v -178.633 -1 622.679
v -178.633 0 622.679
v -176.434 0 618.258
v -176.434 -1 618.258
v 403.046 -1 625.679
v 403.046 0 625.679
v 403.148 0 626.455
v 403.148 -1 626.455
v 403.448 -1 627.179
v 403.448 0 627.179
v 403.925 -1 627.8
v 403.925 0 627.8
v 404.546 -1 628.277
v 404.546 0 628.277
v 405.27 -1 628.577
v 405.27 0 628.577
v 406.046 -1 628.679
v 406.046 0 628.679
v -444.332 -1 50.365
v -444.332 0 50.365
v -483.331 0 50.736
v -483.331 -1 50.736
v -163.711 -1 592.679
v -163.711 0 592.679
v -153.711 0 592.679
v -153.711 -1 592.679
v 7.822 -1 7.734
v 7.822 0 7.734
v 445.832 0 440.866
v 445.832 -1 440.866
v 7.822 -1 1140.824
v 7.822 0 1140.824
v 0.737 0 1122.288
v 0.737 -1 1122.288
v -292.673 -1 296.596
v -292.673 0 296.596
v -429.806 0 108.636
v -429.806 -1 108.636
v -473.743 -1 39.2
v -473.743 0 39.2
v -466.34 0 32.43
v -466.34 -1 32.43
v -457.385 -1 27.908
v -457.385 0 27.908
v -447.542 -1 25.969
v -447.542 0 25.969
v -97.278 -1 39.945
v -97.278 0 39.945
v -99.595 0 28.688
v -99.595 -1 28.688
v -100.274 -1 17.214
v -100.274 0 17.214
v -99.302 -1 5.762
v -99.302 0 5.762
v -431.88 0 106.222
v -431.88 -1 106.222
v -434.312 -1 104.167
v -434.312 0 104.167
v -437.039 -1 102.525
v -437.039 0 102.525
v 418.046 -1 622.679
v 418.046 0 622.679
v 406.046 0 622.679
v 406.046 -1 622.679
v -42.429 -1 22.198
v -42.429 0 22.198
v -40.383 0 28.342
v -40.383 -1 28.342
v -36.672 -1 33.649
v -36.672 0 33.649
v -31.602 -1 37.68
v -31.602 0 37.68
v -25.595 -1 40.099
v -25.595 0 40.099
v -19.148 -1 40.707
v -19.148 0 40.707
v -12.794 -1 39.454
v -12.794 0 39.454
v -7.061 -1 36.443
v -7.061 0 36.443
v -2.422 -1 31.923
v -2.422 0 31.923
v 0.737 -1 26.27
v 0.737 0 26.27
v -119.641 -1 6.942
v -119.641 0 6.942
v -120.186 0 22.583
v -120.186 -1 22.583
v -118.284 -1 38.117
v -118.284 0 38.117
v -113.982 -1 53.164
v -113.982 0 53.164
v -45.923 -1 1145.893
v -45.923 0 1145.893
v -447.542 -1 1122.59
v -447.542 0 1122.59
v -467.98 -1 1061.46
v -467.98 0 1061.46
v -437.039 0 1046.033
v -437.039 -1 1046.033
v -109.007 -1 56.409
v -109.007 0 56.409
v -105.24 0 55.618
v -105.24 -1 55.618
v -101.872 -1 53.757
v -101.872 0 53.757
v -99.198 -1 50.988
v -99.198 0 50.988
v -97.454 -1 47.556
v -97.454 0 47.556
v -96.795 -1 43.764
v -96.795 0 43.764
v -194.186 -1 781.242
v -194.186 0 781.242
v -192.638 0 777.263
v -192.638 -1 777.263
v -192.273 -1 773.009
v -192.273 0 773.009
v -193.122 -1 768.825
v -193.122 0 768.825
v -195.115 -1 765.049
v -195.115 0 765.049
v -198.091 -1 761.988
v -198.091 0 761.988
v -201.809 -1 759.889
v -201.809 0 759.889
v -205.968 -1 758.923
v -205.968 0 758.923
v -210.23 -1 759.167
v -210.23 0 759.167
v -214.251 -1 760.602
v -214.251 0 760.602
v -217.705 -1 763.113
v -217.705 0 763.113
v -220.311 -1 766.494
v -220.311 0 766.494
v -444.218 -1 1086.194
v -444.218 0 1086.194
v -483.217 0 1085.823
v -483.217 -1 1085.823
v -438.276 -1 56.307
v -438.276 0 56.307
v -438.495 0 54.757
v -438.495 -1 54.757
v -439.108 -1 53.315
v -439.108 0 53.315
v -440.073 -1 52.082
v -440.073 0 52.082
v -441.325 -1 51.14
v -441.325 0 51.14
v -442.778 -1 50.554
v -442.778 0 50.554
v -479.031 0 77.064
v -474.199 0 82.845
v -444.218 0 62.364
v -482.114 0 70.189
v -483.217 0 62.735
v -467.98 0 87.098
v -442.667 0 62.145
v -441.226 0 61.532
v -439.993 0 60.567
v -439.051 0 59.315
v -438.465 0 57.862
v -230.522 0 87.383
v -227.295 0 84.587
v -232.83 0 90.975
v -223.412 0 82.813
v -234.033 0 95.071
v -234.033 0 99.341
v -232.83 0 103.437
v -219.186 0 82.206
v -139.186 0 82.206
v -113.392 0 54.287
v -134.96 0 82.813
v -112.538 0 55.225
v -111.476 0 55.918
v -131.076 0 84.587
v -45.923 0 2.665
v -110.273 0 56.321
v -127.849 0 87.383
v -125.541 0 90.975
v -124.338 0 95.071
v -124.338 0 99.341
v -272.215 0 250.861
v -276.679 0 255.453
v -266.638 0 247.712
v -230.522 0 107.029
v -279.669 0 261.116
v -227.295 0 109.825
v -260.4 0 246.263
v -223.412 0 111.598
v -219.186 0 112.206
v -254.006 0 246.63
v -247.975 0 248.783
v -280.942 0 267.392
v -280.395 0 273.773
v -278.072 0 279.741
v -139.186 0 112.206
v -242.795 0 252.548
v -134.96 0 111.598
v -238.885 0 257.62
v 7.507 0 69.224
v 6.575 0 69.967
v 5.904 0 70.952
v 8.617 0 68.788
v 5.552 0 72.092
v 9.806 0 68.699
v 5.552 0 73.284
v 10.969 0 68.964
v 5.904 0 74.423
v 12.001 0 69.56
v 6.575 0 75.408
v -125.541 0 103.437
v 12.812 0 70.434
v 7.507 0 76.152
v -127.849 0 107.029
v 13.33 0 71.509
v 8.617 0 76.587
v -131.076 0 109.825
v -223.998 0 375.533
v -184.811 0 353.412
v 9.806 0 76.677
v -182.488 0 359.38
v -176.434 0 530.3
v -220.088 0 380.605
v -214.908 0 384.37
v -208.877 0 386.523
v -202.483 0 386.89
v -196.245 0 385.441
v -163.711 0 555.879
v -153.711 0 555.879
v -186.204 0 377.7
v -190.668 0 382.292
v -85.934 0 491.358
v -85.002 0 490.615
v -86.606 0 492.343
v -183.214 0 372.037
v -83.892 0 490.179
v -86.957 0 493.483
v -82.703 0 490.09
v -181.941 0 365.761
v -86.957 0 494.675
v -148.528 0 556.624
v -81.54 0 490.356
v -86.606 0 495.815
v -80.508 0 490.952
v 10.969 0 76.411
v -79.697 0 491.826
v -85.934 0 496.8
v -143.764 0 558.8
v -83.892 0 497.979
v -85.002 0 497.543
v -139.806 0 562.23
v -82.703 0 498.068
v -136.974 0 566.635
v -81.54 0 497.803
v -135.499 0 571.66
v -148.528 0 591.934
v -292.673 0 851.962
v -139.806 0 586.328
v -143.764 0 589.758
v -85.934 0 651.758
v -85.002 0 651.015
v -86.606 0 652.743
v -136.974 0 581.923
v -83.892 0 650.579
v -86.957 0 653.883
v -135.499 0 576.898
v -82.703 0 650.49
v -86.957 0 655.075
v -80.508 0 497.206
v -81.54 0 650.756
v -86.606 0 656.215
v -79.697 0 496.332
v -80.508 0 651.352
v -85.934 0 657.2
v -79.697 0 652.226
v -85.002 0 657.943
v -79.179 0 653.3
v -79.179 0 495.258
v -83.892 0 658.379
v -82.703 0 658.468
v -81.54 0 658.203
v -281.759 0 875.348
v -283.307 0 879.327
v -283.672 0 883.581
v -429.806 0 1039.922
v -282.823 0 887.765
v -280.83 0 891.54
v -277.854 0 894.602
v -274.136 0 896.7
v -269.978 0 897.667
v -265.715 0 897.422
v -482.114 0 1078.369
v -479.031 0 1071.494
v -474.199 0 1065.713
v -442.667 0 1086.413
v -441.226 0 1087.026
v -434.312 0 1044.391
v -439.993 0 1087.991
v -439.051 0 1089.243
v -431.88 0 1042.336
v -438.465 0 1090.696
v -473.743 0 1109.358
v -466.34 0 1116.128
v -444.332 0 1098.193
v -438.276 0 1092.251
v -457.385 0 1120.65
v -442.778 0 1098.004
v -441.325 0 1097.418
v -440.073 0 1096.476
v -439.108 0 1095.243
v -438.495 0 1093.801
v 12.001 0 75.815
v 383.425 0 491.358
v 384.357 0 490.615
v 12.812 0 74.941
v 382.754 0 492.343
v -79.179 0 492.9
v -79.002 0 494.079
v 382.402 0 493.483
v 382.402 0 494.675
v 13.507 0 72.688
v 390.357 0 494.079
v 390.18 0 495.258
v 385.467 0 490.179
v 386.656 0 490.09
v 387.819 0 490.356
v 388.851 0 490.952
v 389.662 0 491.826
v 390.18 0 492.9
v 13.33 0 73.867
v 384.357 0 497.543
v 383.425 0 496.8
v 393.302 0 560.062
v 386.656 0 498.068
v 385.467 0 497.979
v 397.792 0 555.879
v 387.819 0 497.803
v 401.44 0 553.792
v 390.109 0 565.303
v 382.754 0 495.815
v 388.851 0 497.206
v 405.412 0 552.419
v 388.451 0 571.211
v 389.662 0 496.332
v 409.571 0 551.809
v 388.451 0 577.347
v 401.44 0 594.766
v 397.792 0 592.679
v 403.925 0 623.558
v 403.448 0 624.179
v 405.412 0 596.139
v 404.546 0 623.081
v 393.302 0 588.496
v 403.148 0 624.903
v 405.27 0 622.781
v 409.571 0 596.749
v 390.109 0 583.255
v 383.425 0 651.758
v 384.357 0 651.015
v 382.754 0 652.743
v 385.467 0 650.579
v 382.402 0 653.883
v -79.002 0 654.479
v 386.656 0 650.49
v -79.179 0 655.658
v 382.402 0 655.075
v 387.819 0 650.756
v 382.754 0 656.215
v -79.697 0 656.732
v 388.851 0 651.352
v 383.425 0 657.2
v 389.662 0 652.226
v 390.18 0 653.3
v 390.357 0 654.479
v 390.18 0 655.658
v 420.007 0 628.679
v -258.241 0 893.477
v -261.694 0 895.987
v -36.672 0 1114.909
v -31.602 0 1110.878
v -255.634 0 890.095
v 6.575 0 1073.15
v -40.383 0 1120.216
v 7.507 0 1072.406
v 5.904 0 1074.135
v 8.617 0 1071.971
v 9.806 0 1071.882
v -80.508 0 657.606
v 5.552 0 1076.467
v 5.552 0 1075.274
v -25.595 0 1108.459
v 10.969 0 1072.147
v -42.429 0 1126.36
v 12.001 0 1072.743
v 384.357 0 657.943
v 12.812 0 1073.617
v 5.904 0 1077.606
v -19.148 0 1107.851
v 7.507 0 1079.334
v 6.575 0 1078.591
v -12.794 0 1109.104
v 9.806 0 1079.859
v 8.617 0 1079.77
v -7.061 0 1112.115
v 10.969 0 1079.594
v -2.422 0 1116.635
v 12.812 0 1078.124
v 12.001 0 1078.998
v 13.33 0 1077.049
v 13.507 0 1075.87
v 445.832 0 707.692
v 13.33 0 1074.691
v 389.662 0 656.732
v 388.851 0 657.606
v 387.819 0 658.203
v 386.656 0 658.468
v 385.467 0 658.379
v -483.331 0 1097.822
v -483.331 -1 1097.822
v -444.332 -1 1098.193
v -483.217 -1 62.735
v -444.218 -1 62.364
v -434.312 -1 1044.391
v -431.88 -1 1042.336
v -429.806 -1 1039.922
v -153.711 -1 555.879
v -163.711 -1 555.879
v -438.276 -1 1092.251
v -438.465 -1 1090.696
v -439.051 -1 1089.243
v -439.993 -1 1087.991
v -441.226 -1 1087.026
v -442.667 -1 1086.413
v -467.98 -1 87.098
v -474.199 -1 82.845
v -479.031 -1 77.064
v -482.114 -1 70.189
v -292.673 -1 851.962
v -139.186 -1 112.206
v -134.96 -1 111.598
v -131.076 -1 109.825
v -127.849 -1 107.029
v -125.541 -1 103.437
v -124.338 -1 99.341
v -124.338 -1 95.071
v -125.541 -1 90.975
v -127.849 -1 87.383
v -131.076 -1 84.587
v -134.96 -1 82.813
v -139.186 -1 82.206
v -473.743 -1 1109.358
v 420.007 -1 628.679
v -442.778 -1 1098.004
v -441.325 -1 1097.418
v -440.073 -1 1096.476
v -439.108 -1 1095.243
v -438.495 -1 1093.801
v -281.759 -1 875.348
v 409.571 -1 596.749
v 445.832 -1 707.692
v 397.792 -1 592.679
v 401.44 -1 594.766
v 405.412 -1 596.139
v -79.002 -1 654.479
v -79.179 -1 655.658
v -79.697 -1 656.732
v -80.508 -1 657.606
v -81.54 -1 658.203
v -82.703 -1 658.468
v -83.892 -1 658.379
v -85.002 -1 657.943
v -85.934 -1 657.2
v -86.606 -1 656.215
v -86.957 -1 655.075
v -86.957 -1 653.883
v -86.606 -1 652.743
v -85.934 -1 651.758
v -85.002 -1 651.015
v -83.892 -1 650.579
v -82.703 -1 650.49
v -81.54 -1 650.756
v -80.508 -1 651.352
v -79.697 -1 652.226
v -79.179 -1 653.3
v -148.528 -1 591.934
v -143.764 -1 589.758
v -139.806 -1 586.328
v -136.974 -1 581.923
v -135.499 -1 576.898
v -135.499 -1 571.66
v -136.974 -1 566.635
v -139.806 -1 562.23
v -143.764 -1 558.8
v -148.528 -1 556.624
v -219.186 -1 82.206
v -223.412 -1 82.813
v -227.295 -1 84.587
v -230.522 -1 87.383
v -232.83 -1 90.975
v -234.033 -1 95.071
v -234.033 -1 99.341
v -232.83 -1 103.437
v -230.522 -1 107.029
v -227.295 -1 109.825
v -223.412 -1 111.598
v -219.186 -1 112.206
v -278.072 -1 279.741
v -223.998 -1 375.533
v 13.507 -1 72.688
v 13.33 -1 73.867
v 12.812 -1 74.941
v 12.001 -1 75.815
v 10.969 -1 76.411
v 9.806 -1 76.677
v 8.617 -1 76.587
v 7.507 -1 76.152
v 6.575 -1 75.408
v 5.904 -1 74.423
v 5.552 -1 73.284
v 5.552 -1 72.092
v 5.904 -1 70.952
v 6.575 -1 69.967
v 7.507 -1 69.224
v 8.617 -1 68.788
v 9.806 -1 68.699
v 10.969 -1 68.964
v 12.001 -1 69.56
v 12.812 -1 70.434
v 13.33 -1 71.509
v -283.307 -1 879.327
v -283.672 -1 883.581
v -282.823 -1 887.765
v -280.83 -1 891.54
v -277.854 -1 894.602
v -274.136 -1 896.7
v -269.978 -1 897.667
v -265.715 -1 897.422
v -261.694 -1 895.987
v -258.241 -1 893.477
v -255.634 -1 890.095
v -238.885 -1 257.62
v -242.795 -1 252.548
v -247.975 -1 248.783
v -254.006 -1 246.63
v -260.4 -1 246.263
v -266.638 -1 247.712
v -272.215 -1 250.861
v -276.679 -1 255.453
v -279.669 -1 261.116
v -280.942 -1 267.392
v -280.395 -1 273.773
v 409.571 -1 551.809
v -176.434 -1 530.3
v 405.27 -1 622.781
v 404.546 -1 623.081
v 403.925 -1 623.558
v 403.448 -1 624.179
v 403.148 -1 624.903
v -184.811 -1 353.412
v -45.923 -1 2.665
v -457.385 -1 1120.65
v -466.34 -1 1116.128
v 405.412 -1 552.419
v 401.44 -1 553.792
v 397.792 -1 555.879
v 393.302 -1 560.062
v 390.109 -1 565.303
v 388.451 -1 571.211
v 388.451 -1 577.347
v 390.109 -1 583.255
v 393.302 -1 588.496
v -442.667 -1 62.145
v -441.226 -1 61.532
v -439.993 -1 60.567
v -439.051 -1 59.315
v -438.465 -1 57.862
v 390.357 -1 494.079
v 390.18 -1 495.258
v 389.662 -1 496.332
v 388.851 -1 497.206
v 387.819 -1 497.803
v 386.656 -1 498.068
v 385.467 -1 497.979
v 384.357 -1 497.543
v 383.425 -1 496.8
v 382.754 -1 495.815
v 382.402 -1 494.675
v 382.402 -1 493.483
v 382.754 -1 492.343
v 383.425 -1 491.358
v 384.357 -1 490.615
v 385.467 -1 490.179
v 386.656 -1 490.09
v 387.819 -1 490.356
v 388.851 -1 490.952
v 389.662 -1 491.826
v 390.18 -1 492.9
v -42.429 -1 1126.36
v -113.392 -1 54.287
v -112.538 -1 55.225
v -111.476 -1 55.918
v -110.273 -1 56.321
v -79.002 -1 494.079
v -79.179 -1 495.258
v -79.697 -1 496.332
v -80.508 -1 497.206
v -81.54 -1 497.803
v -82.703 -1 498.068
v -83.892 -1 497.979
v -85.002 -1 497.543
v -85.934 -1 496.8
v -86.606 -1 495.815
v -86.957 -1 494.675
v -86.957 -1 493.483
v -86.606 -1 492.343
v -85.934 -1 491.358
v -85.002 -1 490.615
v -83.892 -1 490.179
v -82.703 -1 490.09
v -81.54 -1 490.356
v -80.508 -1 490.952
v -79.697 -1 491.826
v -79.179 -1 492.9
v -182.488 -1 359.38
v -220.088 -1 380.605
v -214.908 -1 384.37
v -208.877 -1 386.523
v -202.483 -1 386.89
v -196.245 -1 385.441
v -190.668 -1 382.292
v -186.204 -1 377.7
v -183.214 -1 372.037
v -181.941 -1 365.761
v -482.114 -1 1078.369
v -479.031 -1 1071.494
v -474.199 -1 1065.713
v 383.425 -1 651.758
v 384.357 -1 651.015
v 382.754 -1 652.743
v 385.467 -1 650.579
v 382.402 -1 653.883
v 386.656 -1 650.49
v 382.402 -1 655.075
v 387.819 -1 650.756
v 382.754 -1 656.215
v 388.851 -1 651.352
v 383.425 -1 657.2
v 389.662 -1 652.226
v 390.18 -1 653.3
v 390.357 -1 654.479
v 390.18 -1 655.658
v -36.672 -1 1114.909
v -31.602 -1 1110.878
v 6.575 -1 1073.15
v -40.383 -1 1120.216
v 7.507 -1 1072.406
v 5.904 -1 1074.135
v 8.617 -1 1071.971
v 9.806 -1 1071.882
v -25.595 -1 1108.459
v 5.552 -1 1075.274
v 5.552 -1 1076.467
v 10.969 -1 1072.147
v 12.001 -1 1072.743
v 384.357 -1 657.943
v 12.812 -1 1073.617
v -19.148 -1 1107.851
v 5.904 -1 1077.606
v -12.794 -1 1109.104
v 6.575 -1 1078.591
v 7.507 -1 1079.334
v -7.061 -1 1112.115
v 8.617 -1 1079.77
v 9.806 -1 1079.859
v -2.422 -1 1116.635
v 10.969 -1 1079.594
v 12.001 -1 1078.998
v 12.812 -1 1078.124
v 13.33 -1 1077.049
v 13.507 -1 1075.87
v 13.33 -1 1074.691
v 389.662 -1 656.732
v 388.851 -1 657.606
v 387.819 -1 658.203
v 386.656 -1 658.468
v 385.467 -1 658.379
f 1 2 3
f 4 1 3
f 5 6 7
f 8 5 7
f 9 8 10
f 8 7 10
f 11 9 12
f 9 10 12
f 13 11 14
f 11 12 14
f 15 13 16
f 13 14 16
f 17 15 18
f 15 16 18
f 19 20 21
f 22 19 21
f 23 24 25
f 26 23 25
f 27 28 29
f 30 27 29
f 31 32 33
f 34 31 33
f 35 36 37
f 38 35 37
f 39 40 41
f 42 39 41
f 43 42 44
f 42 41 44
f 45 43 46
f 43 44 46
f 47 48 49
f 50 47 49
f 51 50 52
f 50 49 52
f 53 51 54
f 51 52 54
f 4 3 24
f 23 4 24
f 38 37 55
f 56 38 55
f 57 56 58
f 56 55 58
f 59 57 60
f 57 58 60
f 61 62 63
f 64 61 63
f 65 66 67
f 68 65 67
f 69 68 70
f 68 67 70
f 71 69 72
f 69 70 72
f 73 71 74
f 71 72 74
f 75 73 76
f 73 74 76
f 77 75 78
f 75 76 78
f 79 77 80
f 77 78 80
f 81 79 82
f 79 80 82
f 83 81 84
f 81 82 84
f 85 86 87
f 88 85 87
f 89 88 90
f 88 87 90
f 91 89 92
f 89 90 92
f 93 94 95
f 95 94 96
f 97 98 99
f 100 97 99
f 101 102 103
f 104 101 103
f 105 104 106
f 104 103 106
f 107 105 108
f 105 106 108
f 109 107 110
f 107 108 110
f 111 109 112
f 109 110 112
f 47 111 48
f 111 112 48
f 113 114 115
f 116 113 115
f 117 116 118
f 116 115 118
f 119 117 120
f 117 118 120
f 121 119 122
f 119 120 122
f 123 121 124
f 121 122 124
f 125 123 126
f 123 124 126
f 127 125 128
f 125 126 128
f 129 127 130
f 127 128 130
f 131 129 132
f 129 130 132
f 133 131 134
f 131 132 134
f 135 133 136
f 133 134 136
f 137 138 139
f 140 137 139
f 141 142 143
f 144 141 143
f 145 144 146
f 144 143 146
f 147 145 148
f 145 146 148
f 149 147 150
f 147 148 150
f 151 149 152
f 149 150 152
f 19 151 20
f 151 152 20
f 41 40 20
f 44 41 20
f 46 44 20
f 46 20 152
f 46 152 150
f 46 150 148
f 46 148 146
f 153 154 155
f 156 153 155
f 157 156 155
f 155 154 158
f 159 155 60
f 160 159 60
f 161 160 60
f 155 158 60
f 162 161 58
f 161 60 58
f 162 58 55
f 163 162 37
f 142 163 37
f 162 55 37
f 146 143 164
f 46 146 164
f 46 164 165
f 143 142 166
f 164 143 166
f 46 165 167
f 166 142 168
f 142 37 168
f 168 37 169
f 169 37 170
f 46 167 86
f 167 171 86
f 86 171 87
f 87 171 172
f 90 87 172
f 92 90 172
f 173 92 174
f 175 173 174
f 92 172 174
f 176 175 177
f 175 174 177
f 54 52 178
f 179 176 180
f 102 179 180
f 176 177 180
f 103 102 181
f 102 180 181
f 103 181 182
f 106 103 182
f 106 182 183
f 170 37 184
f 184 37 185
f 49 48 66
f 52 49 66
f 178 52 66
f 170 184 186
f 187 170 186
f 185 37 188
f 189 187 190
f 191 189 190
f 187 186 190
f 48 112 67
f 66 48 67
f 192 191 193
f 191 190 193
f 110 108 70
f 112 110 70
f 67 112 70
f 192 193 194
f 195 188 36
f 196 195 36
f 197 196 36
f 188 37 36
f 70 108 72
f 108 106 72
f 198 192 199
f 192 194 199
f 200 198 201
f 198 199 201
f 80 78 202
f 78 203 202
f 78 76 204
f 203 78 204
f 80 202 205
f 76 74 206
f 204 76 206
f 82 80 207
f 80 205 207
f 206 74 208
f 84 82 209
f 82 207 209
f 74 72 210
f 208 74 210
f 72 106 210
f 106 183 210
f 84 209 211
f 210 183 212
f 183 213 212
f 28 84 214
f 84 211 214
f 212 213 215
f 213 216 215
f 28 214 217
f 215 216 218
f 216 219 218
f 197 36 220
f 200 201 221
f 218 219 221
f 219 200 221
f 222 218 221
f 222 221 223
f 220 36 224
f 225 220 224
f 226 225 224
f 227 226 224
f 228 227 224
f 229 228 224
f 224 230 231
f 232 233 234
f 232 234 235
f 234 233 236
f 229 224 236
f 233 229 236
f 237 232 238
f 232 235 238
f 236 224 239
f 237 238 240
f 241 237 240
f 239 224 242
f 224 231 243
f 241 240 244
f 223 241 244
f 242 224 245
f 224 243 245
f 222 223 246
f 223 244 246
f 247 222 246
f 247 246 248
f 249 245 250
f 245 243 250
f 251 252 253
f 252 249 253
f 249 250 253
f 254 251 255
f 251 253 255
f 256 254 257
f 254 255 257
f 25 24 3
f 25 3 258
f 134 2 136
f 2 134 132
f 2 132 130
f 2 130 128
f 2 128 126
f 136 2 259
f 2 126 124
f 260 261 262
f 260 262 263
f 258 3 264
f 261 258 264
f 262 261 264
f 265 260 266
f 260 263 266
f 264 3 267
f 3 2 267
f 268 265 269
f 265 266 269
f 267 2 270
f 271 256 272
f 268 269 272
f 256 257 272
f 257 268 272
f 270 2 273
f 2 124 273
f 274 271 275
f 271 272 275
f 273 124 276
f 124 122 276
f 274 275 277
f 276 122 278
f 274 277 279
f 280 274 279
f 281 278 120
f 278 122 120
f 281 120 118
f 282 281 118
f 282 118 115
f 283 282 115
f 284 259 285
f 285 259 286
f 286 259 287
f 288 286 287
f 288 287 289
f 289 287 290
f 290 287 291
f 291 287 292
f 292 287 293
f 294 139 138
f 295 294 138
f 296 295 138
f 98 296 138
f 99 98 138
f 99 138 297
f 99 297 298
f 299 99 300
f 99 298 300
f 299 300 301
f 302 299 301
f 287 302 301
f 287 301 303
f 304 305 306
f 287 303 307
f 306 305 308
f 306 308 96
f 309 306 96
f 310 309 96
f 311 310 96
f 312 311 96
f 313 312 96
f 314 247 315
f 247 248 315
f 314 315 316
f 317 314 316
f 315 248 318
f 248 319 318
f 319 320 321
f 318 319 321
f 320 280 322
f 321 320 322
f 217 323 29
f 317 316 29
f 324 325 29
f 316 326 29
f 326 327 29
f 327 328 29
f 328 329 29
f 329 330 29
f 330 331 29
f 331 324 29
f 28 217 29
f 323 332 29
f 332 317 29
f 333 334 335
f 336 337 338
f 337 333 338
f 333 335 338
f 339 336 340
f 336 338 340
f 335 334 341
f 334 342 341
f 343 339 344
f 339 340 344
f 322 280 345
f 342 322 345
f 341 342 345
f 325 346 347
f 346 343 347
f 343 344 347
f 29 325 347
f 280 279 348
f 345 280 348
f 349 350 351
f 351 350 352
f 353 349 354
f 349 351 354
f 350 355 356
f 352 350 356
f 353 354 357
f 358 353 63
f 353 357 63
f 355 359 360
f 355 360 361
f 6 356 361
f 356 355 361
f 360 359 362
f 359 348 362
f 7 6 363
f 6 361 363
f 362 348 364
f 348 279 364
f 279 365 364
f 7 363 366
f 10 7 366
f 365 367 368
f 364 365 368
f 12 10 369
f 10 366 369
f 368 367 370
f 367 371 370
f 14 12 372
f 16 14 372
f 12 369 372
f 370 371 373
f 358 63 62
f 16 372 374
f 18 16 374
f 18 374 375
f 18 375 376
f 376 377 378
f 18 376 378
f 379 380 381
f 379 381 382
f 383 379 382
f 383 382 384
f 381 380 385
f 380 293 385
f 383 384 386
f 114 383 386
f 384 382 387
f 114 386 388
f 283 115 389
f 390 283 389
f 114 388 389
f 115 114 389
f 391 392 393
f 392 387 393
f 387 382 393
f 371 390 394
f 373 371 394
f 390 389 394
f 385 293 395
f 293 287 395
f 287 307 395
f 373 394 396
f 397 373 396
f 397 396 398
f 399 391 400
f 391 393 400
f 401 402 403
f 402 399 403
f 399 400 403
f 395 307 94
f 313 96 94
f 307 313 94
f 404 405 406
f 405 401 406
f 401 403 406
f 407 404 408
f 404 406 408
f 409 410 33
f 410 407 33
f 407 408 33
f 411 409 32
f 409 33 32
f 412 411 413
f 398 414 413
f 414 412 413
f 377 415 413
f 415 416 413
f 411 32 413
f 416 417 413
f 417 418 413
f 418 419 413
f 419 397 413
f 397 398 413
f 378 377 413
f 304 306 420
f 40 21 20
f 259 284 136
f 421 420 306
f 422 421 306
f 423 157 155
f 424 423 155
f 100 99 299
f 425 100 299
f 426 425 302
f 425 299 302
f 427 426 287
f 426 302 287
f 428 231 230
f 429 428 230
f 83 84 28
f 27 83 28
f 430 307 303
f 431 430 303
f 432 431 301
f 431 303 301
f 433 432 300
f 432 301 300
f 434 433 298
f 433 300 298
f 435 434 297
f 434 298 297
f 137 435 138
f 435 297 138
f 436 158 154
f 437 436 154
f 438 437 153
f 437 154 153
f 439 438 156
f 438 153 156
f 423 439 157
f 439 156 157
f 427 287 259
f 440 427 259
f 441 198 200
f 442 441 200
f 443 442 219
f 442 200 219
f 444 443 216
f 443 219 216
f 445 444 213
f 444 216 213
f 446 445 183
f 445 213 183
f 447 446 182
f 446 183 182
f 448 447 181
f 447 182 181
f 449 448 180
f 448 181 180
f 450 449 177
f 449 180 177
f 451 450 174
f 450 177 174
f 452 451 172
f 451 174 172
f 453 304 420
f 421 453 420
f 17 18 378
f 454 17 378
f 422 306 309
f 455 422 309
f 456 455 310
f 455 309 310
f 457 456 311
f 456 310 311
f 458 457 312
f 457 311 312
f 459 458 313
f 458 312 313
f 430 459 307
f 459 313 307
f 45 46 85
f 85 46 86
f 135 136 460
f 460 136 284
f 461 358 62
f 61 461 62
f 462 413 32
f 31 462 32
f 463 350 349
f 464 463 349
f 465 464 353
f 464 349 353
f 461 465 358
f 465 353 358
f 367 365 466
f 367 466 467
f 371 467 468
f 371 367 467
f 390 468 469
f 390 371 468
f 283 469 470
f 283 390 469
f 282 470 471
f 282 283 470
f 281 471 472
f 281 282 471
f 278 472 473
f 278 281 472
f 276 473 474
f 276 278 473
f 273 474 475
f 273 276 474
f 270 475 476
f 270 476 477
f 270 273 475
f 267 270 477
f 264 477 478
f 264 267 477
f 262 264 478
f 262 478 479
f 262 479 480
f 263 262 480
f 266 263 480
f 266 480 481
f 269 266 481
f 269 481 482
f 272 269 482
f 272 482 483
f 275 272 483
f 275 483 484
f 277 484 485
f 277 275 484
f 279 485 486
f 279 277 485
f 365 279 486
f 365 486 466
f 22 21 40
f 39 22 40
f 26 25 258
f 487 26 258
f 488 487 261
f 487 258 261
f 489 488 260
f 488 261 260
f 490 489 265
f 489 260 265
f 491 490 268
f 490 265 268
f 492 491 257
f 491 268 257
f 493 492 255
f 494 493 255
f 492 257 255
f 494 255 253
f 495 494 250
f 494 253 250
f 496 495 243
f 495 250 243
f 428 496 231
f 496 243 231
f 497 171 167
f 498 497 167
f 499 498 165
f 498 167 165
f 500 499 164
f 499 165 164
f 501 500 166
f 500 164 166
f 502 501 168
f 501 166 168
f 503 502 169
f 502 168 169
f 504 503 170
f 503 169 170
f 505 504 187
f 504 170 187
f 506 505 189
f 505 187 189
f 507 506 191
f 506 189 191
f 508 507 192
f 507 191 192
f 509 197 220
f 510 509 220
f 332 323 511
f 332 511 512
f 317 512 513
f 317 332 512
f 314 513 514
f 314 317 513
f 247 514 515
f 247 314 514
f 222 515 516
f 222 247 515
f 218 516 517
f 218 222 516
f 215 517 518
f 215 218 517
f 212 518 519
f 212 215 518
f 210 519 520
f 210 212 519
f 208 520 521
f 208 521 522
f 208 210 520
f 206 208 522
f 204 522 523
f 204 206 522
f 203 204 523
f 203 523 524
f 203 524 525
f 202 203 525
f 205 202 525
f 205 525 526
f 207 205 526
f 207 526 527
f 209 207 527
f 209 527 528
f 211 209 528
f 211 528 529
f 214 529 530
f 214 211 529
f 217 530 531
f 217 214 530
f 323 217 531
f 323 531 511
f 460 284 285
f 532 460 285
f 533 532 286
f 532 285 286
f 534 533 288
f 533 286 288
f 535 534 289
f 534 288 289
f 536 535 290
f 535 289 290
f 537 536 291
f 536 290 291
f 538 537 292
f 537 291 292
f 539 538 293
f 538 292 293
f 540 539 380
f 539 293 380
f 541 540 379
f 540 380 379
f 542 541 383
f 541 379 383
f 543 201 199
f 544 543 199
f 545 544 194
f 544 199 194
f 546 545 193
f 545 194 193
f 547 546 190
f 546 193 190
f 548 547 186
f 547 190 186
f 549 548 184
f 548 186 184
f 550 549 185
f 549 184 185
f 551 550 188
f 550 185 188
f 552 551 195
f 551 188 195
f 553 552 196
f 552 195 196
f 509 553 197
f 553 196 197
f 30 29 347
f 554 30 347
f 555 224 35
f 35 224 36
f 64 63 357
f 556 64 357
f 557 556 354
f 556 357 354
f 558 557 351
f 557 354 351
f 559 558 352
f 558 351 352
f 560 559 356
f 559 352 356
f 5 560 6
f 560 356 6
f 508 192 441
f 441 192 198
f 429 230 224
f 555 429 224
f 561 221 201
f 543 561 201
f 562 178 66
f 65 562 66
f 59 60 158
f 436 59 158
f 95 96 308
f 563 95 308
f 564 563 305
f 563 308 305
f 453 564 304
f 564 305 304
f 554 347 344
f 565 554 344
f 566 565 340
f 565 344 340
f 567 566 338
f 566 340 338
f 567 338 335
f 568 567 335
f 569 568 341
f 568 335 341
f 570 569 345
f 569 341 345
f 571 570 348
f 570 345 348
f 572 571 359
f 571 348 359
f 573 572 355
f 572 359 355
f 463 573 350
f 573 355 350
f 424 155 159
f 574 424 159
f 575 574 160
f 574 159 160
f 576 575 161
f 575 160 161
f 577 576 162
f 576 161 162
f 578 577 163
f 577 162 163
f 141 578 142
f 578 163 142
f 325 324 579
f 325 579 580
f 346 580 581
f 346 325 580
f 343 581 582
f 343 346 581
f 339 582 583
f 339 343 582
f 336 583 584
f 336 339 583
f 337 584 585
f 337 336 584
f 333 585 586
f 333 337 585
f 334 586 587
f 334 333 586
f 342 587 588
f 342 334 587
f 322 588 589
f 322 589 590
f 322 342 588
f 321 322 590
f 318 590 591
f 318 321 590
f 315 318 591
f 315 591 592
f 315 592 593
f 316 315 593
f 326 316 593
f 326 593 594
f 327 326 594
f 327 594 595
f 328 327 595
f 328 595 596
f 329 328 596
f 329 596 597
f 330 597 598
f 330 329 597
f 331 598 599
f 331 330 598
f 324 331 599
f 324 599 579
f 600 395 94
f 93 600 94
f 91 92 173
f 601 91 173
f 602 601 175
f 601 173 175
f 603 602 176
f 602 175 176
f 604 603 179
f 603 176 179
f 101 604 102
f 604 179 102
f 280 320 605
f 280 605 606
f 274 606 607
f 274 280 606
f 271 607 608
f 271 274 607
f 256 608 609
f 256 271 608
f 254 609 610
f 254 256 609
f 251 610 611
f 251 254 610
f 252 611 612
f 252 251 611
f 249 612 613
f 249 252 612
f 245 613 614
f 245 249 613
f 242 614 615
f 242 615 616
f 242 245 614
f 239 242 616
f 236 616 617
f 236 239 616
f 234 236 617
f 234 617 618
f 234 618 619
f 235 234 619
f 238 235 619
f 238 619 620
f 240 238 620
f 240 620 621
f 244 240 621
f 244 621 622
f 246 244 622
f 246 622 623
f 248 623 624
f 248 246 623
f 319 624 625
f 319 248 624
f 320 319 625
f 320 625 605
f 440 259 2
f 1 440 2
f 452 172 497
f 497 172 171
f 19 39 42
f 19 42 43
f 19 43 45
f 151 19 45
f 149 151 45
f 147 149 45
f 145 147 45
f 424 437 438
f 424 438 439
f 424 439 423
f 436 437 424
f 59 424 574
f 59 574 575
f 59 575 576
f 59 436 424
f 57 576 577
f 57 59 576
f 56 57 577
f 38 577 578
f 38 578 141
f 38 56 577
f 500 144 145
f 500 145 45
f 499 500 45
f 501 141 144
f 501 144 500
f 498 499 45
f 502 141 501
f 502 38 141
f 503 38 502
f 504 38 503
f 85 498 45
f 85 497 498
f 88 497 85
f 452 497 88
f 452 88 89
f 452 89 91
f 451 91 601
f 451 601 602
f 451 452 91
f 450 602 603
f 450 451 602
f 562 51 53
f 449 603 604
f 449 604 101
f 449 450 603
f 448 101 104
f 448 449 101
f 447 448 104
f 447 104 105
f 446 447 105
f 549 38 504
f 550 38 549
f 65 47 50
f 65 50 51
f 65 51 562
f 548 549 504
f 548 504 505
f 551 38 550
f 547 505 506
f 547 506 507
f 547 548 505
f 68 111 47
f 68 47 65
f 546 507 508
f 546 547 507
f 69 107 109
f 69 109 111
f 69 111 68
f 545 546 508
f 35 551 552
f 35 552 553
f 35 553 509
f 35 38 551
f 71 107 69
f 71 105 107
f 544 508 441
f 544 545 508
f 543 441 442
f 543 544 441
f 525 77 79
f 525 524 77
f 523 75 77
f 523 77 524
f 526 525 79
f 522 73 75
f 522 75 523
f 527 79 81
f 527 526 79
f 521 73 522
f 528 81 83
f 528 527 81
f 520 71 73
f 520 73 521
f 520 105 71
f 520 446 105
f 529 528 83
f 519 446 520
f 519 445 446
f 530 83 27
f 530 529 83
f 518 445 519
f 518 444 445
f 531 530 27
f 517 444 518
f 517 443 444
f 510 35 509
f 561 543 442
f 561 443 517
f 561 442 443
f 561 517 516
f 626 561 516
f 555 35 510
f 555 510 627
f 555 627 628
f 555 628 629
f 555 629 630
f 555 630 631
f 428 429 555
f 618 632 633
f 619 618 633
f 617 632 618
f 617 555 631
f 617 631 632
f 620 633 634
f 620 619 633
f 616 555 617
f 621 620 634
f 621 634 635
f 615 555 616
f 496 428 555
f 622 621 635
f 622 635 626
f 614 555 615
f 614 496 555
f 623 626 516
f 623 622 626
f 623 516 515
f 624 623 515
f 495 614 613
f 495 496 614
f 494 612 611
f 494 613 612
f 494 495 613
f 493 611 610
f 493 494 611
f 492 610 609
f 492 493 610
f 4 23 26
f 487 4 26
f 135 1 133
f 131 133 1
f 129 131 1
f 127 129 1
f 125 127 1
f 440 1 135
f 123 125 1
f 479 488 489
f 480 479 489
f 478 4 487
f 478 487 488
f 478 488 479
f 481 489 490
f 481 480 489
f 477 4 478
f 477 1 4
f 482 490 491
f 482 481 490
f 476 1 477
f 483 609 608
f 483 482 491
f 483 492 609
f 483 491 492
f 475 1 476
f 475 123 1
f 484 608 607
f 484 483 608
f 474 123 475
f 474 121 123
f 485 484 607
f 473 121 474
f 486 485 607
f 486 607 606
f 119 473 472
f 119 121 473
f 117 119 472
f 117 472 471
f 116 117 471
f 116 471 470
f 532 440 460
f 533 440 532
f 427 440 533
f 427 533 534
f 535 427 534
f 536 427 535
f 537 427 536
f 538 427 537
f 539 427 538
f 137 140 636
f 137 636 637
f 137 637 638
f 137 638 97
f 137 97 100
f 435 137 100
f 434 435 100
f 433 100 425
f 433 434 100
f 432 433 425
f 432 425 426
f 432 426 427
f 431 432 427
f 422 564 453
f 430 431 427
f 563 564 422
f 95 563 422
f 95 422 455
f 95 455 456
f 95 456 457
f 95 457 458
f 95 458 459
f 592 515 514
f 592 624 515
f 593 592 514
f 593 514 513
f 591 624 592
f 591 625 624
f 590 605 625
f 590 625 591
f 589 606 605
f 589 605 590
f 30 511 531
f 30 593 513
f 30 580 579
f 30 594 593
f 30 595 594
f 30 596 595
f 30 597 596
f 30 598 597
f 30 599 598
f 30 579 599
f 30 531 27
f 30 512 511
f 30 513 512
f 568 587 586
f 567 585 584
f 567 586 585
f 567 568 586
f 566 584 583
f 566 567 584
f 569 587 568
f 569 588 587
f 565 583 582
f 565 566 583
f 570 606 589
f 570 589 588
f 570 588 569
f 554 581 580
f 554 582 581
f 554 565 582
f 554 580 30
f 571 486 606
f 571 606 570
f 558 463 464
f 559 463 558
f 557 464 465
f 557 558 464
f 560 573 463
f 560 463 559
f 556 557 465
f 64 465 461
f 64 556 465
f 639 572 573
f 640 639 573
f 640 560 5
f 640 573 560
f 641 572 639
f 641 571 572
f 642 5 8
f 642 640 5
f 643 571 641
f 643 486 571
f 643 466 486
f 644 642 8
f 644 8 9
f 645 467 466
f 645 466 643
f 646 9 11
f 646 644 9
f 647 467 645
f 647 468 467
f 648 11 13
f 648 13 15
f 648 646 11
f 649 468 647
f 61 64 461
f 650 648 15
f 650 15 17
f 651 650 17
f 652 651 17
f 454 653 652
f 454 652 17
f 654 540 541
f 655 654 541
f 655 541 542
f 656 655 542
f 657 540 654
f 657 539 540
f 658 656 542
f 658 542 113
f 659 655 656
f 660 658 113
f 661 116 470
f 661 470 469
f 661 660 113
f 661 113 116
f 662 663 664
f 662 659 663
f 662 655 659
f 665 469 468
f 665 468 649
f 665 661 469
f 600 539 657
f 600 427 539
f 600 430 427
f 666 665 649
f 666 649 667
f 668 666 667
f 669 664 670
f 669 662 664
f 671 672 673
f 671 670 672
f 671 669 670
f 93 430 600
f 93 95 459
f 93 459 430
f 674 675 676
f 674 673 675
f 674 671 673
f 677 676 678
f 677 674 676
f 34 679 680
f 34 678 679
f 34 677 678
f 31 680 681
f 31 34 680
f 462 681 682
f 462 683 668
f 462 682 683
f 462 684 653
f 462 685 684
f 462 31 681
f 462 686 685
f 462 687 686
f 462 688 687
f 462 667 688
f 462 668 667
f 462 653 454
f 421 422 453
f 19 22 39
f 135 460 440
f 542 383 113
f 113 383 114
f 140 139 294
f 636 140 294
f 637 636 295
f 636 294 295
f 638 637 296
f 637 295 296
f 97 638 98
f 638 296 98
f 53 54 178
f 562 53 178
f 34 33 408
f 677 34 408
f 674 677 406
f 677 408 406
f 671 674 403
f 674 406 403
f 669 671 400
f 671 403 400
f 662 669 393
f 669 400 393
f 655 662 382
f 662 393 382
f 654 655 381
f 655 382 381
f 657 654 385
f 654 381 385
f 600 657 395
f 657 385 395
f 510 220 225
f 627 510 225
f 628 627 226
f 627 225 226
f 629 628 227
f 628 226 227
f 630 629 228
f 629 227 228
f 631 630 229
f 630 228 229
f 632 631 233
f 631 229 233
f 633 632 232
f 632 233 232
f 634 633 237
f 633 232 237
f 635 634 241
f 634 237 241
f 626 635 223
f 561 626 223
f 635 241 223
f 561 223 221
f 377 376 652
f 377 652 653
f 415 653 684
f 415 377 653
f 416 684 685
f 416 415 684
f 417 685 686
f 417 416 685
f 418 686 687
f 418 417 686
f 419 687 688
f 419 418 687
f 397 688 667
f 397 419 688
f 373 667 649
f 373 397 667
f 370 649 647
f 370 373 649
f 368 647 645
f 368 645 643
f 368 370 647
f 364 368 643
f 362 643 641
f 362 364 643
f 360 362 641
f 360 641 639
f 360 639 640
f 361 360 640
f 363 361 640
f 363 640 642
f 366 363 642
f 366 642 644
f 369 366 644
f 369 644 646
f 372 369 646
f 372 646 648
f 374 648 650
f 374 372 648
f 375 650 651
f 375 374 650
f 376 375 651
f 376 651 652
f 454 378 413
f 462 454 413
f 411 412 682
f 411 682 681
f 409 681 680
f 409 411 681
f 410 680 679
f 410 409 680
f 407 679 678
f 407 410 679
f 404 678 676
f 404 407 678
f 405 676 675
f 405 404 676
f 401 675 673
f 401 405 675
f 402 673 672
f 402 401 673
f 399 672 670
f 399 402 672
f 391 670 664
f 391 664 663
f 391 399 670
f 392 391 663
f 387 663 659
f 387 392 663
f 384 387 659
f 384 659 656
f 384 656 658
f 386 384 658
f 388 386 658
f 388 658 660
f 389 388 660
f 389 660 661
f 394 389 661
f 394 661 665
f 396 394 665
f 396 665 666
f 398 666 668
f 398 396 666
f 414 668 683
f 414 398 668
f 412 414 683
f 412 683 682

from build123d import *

# Parameters (mm, degrees)
F0_R     = 4
F1_DEPTH = 1


with BuildPart() as f1:
    # F0 (on Front) → F1 (new body)
    with BuildSketch(Plane.XZ):
        with BuildLine():
            ThreePointArc((-42.428788, 22.197763), (-22.393428, 40.636528), (0.736568, 26.269656))
            Line((0.736568, 26.269656), (7.82161, 7.734496))
            Line((7.82161, 7.734496), (445.831745, 440.866256))
            Line((445.831745, 440.866256), (409.571118, 551.809463))
            ThreePointArc((409.571118, 551.809463), (403.393924, 553.012383), (397.791506, 555.879027))
            Line((397.791506, 555.879027), (-153.711431, 555.879027))
            Line((-153.711431, 555.879027), (-163.711431, 555.879027))
            Line((-163.711431, 555.879027), (-176.433934, 530.299822))
            Line((-176.433934, 530.299822), (-292.672837, 296.595913))
            Line((-292.672837, 296.595913), (-429.805557, 108.635613))
            ThreePointArc((-429.805557, 108.635613), (-433.055197, 105.145969), (-437.038546, 102.524765))
            Line((-437.038546, 102.524765), (-467.979575, 87.098137))
            ThreePointArc((-467.979575, 87.098137), (-479.031049, 77.063624), (-483.216559, 62.73505))
            Line((-483.216559, 62.73505), (-444.218322, 62.364245))
            ThreePointArc((-444.218322, 62.364245), (-439.992581, 60.566627), (-438.27564, 56.307469))
            ThreePointArc((-438.27564, 56.307469), (-440.073258, 52.081729), (-444.332415, 50.364787))
            Line((-444.332415, 50.364787), (-483.330653, 50.735592))
            Line((-483.330653, 50.735592), (-473.742625, 39.200006))
            ThreePointArc((-473.742625, 39.200006), (-462.016917, 29.862605), (-447.542263, 25.968544))
            Line((-447.542263, 25.968544), (-119.640526, 6.942116))
            ThreePointArc((-119.640526, 6.942116), (-119.539343, 30.38703), (-113.982147, 53.164032))
            ThreePointArc((-113.982147, 53.164032), (-112.028876, 55.605369), (-109.00742, 56.409233))
            Line((-109.00742, 56.409233), (-91.138541, 55.372396))
            ThreePointArc((-91.138541, 55.372396), (-94.609764, 47.818656), (-97.278364, 39.945477))
            ThreePointArc((-97.278364, 39.945477), (-100.140537, 22.963258), (-99.30184, 5.761968))
            Line((-99.30184, 5.761968), (-45.922757, 2.664658))
            Line((-45.922757, 2.664658), (-42.428788, 22.197763))
        make_face()
        with BuildLine():
            ThreePointArc((-219.185589, 82.205842), (-234.185589, 97.205842), (-219.185589, 112.205842))
            Line((-219.185589, 112.205842), (-139.185589, 112.205842))
            ThreePointArc((-139.185589, 112.205842), (-124.185589, 97.205842), (-139.185589, 82.205842))
            Line((-139.185589, 82.205842), (-219.185589, 82.205842))
        make_face(mode=Mode.SUBTRACT)
        with BuildLine():
            ThreePointArc((-238.884885, 257.620199), (-269.539195, 249.087128), (-278.072266, 279.741438))
            Line((-278.072266, 279.741438), (-223.998126, 375.532812))
            ThreePointArc((-223.998126, 375.532812), (-193.343817, 384.065883), (-184.810746, 353.411573))
            Line((-184.810746, 353.411573), (-238.884885, 257.620199))
        make_face(mode=Mode.SUBTRACT)
        with Locations((-83.001788, 494.079027)):
            Circle(F0_R, mode=Mode.SUBTRACT)
        with Locations((9.507399, 72.687717)):
            Circle(F0_R, mode=Mode.SUBTRACT)
        with Locations((386.357424, 494.079027)):
            Circle(F0_R, mode=Mode.SUBTRACT)
        with BuildLine():
            ThreePointArc((-109.00742, 56.409233), (-99.197738, 50.987949), (-97.278364, 39.945477))
            ThreePointArc((-97.278364, 39.945477), (-94.609764, 47.818656), (-91.138541, 55.372396))
            Line((-91.138541, 55.372396), (-109.00742, 56.409233))
        make_face()
        with BuildLine():
            Line((-153.711431, 555.879027), (397.791506, 555.879027))
            ThreePointArc((397.791506, 555.879027), (388.241023, 574.279027), (397.791506, 592.679027))
            Line((397.791506, 592.679027), (-153.711431, 592.679027))
            ThreePointArc((-153.711431, 592.679027), (-135.311431, 574.279027), (-153.711431, 555.879027))
        make_face()
        with BuildLine():
            Line((-153.711431, 592.679027), (397.791506, 592.679027))
            ThreePointArc((397.791506, 592.679027), (403.393924, 595.545671), (409.571118, 596.748591))
            Line((409.571118, 596.748591), (418.046209, 622.679027))
            Line((418.046209, 622.679027), (406.046209, 622.679027))
            ThreePointArc((406.046209, 622.679027), (403.924889, 623.557707), (403.046209, 625.679027))
            ThreePointArc((403.046209, 625.679027), (403.924889, 627.800347), (406.046209, 628.679027))
            Line((406.046209, 628.679027), (420.007247, 628.679027))
            Line((420.007247, 628.679027), (445.831745, 707.691799))
            Line((445.831745, 707.691799), (7.82161, 1140.823559))
            Line((7.82161, 1140.823559), (0.736568, 1122.288398))
            ThreePointArc((0.736568, 1122.288398), (-22.393428, 1107.921526), (-42.428788, 1126.360291))
            Line((-42.428788, 1126.360291), (-45.922757, 1145.893396))
            Line((-45.922757, 1145.893396), (-447.542263, 1122.58951))
            ThreePointArc((-447.542263, 1122.58951), (-462.016917, 1118.695449), (-473.742625, 1109.358048))
            Line((-473.742625, 1109.358048), (-483.330653, 1097.822462))
            Line((-483.330653, 1097.822462), (-444.332415, 1098.193267))
            ThreePointArc((-444.332415, 1098.193267), (-440.073258, 1096.476326), (-438.27564, 1092.250585))
            ThreePointArc((-438.27564, 1092.250585), (-439.992581, 1087.991428), (-444.218322, 1086.19381))
            Line((-444.218322, 1086.19381), (-483.216559, 1085.823005))
            ThreePointArc((-483.216559, 1085.823005), (-479.031049, 1071.494431), (-467.979575, 1061.459917))
            Line((-467.979575, 1061.459917), (-437.038546, 1046.033289))
            ThreePointArc((-437.038546, 1046.033289), (-433.055197, 1043.412085), (-429.805557, 1039.922441))
            Line((-429.805557, 1039.922441), (-292.672837, 851.962142))
            Line((-292.672837, 851.962142), (-178.632735, 622.679027))
            Line((-178.632735, 622.679027), (-176.433934, 618.258232))
            Line((-176.433934, 618.258232), (-163.711431, 592.679027))
            Line((-163.711431, 592.679027), (-153.711431, 592.679027))
        make_face()
        with Locations((-83.001788, 654.479027)):
            Circle(F0_R, mode=Mode.SUBTRACT)
        with BuildLine():
            ThreePointArc((-281.759139, 875.347847), (-276.070425, 895.784053), (-255.634219, 890.095339))
            Line((-255.634219, 890.095339), (-194.186333, 781.241505))
            ThreePointArc((-194.186333, 781.241505), (-199.875047, 760.805298), (-220.311253, 766.494012))
            Line((-220.311253, 766.494012), (-281.759139, 875.347847))
        make_face(mode=Mode.SUBTRACT)
        with Locations((386.357424, 654.479027)):
            Circle(F0_R, mode=Mode.SUBTRACT)
        with Locations((9.507399, 1075.870338)):
            Circle(F0_R, mode=Mode.SUBTRACT)
    extrude(amount=F1_DEPTH)


solid = f1.part
